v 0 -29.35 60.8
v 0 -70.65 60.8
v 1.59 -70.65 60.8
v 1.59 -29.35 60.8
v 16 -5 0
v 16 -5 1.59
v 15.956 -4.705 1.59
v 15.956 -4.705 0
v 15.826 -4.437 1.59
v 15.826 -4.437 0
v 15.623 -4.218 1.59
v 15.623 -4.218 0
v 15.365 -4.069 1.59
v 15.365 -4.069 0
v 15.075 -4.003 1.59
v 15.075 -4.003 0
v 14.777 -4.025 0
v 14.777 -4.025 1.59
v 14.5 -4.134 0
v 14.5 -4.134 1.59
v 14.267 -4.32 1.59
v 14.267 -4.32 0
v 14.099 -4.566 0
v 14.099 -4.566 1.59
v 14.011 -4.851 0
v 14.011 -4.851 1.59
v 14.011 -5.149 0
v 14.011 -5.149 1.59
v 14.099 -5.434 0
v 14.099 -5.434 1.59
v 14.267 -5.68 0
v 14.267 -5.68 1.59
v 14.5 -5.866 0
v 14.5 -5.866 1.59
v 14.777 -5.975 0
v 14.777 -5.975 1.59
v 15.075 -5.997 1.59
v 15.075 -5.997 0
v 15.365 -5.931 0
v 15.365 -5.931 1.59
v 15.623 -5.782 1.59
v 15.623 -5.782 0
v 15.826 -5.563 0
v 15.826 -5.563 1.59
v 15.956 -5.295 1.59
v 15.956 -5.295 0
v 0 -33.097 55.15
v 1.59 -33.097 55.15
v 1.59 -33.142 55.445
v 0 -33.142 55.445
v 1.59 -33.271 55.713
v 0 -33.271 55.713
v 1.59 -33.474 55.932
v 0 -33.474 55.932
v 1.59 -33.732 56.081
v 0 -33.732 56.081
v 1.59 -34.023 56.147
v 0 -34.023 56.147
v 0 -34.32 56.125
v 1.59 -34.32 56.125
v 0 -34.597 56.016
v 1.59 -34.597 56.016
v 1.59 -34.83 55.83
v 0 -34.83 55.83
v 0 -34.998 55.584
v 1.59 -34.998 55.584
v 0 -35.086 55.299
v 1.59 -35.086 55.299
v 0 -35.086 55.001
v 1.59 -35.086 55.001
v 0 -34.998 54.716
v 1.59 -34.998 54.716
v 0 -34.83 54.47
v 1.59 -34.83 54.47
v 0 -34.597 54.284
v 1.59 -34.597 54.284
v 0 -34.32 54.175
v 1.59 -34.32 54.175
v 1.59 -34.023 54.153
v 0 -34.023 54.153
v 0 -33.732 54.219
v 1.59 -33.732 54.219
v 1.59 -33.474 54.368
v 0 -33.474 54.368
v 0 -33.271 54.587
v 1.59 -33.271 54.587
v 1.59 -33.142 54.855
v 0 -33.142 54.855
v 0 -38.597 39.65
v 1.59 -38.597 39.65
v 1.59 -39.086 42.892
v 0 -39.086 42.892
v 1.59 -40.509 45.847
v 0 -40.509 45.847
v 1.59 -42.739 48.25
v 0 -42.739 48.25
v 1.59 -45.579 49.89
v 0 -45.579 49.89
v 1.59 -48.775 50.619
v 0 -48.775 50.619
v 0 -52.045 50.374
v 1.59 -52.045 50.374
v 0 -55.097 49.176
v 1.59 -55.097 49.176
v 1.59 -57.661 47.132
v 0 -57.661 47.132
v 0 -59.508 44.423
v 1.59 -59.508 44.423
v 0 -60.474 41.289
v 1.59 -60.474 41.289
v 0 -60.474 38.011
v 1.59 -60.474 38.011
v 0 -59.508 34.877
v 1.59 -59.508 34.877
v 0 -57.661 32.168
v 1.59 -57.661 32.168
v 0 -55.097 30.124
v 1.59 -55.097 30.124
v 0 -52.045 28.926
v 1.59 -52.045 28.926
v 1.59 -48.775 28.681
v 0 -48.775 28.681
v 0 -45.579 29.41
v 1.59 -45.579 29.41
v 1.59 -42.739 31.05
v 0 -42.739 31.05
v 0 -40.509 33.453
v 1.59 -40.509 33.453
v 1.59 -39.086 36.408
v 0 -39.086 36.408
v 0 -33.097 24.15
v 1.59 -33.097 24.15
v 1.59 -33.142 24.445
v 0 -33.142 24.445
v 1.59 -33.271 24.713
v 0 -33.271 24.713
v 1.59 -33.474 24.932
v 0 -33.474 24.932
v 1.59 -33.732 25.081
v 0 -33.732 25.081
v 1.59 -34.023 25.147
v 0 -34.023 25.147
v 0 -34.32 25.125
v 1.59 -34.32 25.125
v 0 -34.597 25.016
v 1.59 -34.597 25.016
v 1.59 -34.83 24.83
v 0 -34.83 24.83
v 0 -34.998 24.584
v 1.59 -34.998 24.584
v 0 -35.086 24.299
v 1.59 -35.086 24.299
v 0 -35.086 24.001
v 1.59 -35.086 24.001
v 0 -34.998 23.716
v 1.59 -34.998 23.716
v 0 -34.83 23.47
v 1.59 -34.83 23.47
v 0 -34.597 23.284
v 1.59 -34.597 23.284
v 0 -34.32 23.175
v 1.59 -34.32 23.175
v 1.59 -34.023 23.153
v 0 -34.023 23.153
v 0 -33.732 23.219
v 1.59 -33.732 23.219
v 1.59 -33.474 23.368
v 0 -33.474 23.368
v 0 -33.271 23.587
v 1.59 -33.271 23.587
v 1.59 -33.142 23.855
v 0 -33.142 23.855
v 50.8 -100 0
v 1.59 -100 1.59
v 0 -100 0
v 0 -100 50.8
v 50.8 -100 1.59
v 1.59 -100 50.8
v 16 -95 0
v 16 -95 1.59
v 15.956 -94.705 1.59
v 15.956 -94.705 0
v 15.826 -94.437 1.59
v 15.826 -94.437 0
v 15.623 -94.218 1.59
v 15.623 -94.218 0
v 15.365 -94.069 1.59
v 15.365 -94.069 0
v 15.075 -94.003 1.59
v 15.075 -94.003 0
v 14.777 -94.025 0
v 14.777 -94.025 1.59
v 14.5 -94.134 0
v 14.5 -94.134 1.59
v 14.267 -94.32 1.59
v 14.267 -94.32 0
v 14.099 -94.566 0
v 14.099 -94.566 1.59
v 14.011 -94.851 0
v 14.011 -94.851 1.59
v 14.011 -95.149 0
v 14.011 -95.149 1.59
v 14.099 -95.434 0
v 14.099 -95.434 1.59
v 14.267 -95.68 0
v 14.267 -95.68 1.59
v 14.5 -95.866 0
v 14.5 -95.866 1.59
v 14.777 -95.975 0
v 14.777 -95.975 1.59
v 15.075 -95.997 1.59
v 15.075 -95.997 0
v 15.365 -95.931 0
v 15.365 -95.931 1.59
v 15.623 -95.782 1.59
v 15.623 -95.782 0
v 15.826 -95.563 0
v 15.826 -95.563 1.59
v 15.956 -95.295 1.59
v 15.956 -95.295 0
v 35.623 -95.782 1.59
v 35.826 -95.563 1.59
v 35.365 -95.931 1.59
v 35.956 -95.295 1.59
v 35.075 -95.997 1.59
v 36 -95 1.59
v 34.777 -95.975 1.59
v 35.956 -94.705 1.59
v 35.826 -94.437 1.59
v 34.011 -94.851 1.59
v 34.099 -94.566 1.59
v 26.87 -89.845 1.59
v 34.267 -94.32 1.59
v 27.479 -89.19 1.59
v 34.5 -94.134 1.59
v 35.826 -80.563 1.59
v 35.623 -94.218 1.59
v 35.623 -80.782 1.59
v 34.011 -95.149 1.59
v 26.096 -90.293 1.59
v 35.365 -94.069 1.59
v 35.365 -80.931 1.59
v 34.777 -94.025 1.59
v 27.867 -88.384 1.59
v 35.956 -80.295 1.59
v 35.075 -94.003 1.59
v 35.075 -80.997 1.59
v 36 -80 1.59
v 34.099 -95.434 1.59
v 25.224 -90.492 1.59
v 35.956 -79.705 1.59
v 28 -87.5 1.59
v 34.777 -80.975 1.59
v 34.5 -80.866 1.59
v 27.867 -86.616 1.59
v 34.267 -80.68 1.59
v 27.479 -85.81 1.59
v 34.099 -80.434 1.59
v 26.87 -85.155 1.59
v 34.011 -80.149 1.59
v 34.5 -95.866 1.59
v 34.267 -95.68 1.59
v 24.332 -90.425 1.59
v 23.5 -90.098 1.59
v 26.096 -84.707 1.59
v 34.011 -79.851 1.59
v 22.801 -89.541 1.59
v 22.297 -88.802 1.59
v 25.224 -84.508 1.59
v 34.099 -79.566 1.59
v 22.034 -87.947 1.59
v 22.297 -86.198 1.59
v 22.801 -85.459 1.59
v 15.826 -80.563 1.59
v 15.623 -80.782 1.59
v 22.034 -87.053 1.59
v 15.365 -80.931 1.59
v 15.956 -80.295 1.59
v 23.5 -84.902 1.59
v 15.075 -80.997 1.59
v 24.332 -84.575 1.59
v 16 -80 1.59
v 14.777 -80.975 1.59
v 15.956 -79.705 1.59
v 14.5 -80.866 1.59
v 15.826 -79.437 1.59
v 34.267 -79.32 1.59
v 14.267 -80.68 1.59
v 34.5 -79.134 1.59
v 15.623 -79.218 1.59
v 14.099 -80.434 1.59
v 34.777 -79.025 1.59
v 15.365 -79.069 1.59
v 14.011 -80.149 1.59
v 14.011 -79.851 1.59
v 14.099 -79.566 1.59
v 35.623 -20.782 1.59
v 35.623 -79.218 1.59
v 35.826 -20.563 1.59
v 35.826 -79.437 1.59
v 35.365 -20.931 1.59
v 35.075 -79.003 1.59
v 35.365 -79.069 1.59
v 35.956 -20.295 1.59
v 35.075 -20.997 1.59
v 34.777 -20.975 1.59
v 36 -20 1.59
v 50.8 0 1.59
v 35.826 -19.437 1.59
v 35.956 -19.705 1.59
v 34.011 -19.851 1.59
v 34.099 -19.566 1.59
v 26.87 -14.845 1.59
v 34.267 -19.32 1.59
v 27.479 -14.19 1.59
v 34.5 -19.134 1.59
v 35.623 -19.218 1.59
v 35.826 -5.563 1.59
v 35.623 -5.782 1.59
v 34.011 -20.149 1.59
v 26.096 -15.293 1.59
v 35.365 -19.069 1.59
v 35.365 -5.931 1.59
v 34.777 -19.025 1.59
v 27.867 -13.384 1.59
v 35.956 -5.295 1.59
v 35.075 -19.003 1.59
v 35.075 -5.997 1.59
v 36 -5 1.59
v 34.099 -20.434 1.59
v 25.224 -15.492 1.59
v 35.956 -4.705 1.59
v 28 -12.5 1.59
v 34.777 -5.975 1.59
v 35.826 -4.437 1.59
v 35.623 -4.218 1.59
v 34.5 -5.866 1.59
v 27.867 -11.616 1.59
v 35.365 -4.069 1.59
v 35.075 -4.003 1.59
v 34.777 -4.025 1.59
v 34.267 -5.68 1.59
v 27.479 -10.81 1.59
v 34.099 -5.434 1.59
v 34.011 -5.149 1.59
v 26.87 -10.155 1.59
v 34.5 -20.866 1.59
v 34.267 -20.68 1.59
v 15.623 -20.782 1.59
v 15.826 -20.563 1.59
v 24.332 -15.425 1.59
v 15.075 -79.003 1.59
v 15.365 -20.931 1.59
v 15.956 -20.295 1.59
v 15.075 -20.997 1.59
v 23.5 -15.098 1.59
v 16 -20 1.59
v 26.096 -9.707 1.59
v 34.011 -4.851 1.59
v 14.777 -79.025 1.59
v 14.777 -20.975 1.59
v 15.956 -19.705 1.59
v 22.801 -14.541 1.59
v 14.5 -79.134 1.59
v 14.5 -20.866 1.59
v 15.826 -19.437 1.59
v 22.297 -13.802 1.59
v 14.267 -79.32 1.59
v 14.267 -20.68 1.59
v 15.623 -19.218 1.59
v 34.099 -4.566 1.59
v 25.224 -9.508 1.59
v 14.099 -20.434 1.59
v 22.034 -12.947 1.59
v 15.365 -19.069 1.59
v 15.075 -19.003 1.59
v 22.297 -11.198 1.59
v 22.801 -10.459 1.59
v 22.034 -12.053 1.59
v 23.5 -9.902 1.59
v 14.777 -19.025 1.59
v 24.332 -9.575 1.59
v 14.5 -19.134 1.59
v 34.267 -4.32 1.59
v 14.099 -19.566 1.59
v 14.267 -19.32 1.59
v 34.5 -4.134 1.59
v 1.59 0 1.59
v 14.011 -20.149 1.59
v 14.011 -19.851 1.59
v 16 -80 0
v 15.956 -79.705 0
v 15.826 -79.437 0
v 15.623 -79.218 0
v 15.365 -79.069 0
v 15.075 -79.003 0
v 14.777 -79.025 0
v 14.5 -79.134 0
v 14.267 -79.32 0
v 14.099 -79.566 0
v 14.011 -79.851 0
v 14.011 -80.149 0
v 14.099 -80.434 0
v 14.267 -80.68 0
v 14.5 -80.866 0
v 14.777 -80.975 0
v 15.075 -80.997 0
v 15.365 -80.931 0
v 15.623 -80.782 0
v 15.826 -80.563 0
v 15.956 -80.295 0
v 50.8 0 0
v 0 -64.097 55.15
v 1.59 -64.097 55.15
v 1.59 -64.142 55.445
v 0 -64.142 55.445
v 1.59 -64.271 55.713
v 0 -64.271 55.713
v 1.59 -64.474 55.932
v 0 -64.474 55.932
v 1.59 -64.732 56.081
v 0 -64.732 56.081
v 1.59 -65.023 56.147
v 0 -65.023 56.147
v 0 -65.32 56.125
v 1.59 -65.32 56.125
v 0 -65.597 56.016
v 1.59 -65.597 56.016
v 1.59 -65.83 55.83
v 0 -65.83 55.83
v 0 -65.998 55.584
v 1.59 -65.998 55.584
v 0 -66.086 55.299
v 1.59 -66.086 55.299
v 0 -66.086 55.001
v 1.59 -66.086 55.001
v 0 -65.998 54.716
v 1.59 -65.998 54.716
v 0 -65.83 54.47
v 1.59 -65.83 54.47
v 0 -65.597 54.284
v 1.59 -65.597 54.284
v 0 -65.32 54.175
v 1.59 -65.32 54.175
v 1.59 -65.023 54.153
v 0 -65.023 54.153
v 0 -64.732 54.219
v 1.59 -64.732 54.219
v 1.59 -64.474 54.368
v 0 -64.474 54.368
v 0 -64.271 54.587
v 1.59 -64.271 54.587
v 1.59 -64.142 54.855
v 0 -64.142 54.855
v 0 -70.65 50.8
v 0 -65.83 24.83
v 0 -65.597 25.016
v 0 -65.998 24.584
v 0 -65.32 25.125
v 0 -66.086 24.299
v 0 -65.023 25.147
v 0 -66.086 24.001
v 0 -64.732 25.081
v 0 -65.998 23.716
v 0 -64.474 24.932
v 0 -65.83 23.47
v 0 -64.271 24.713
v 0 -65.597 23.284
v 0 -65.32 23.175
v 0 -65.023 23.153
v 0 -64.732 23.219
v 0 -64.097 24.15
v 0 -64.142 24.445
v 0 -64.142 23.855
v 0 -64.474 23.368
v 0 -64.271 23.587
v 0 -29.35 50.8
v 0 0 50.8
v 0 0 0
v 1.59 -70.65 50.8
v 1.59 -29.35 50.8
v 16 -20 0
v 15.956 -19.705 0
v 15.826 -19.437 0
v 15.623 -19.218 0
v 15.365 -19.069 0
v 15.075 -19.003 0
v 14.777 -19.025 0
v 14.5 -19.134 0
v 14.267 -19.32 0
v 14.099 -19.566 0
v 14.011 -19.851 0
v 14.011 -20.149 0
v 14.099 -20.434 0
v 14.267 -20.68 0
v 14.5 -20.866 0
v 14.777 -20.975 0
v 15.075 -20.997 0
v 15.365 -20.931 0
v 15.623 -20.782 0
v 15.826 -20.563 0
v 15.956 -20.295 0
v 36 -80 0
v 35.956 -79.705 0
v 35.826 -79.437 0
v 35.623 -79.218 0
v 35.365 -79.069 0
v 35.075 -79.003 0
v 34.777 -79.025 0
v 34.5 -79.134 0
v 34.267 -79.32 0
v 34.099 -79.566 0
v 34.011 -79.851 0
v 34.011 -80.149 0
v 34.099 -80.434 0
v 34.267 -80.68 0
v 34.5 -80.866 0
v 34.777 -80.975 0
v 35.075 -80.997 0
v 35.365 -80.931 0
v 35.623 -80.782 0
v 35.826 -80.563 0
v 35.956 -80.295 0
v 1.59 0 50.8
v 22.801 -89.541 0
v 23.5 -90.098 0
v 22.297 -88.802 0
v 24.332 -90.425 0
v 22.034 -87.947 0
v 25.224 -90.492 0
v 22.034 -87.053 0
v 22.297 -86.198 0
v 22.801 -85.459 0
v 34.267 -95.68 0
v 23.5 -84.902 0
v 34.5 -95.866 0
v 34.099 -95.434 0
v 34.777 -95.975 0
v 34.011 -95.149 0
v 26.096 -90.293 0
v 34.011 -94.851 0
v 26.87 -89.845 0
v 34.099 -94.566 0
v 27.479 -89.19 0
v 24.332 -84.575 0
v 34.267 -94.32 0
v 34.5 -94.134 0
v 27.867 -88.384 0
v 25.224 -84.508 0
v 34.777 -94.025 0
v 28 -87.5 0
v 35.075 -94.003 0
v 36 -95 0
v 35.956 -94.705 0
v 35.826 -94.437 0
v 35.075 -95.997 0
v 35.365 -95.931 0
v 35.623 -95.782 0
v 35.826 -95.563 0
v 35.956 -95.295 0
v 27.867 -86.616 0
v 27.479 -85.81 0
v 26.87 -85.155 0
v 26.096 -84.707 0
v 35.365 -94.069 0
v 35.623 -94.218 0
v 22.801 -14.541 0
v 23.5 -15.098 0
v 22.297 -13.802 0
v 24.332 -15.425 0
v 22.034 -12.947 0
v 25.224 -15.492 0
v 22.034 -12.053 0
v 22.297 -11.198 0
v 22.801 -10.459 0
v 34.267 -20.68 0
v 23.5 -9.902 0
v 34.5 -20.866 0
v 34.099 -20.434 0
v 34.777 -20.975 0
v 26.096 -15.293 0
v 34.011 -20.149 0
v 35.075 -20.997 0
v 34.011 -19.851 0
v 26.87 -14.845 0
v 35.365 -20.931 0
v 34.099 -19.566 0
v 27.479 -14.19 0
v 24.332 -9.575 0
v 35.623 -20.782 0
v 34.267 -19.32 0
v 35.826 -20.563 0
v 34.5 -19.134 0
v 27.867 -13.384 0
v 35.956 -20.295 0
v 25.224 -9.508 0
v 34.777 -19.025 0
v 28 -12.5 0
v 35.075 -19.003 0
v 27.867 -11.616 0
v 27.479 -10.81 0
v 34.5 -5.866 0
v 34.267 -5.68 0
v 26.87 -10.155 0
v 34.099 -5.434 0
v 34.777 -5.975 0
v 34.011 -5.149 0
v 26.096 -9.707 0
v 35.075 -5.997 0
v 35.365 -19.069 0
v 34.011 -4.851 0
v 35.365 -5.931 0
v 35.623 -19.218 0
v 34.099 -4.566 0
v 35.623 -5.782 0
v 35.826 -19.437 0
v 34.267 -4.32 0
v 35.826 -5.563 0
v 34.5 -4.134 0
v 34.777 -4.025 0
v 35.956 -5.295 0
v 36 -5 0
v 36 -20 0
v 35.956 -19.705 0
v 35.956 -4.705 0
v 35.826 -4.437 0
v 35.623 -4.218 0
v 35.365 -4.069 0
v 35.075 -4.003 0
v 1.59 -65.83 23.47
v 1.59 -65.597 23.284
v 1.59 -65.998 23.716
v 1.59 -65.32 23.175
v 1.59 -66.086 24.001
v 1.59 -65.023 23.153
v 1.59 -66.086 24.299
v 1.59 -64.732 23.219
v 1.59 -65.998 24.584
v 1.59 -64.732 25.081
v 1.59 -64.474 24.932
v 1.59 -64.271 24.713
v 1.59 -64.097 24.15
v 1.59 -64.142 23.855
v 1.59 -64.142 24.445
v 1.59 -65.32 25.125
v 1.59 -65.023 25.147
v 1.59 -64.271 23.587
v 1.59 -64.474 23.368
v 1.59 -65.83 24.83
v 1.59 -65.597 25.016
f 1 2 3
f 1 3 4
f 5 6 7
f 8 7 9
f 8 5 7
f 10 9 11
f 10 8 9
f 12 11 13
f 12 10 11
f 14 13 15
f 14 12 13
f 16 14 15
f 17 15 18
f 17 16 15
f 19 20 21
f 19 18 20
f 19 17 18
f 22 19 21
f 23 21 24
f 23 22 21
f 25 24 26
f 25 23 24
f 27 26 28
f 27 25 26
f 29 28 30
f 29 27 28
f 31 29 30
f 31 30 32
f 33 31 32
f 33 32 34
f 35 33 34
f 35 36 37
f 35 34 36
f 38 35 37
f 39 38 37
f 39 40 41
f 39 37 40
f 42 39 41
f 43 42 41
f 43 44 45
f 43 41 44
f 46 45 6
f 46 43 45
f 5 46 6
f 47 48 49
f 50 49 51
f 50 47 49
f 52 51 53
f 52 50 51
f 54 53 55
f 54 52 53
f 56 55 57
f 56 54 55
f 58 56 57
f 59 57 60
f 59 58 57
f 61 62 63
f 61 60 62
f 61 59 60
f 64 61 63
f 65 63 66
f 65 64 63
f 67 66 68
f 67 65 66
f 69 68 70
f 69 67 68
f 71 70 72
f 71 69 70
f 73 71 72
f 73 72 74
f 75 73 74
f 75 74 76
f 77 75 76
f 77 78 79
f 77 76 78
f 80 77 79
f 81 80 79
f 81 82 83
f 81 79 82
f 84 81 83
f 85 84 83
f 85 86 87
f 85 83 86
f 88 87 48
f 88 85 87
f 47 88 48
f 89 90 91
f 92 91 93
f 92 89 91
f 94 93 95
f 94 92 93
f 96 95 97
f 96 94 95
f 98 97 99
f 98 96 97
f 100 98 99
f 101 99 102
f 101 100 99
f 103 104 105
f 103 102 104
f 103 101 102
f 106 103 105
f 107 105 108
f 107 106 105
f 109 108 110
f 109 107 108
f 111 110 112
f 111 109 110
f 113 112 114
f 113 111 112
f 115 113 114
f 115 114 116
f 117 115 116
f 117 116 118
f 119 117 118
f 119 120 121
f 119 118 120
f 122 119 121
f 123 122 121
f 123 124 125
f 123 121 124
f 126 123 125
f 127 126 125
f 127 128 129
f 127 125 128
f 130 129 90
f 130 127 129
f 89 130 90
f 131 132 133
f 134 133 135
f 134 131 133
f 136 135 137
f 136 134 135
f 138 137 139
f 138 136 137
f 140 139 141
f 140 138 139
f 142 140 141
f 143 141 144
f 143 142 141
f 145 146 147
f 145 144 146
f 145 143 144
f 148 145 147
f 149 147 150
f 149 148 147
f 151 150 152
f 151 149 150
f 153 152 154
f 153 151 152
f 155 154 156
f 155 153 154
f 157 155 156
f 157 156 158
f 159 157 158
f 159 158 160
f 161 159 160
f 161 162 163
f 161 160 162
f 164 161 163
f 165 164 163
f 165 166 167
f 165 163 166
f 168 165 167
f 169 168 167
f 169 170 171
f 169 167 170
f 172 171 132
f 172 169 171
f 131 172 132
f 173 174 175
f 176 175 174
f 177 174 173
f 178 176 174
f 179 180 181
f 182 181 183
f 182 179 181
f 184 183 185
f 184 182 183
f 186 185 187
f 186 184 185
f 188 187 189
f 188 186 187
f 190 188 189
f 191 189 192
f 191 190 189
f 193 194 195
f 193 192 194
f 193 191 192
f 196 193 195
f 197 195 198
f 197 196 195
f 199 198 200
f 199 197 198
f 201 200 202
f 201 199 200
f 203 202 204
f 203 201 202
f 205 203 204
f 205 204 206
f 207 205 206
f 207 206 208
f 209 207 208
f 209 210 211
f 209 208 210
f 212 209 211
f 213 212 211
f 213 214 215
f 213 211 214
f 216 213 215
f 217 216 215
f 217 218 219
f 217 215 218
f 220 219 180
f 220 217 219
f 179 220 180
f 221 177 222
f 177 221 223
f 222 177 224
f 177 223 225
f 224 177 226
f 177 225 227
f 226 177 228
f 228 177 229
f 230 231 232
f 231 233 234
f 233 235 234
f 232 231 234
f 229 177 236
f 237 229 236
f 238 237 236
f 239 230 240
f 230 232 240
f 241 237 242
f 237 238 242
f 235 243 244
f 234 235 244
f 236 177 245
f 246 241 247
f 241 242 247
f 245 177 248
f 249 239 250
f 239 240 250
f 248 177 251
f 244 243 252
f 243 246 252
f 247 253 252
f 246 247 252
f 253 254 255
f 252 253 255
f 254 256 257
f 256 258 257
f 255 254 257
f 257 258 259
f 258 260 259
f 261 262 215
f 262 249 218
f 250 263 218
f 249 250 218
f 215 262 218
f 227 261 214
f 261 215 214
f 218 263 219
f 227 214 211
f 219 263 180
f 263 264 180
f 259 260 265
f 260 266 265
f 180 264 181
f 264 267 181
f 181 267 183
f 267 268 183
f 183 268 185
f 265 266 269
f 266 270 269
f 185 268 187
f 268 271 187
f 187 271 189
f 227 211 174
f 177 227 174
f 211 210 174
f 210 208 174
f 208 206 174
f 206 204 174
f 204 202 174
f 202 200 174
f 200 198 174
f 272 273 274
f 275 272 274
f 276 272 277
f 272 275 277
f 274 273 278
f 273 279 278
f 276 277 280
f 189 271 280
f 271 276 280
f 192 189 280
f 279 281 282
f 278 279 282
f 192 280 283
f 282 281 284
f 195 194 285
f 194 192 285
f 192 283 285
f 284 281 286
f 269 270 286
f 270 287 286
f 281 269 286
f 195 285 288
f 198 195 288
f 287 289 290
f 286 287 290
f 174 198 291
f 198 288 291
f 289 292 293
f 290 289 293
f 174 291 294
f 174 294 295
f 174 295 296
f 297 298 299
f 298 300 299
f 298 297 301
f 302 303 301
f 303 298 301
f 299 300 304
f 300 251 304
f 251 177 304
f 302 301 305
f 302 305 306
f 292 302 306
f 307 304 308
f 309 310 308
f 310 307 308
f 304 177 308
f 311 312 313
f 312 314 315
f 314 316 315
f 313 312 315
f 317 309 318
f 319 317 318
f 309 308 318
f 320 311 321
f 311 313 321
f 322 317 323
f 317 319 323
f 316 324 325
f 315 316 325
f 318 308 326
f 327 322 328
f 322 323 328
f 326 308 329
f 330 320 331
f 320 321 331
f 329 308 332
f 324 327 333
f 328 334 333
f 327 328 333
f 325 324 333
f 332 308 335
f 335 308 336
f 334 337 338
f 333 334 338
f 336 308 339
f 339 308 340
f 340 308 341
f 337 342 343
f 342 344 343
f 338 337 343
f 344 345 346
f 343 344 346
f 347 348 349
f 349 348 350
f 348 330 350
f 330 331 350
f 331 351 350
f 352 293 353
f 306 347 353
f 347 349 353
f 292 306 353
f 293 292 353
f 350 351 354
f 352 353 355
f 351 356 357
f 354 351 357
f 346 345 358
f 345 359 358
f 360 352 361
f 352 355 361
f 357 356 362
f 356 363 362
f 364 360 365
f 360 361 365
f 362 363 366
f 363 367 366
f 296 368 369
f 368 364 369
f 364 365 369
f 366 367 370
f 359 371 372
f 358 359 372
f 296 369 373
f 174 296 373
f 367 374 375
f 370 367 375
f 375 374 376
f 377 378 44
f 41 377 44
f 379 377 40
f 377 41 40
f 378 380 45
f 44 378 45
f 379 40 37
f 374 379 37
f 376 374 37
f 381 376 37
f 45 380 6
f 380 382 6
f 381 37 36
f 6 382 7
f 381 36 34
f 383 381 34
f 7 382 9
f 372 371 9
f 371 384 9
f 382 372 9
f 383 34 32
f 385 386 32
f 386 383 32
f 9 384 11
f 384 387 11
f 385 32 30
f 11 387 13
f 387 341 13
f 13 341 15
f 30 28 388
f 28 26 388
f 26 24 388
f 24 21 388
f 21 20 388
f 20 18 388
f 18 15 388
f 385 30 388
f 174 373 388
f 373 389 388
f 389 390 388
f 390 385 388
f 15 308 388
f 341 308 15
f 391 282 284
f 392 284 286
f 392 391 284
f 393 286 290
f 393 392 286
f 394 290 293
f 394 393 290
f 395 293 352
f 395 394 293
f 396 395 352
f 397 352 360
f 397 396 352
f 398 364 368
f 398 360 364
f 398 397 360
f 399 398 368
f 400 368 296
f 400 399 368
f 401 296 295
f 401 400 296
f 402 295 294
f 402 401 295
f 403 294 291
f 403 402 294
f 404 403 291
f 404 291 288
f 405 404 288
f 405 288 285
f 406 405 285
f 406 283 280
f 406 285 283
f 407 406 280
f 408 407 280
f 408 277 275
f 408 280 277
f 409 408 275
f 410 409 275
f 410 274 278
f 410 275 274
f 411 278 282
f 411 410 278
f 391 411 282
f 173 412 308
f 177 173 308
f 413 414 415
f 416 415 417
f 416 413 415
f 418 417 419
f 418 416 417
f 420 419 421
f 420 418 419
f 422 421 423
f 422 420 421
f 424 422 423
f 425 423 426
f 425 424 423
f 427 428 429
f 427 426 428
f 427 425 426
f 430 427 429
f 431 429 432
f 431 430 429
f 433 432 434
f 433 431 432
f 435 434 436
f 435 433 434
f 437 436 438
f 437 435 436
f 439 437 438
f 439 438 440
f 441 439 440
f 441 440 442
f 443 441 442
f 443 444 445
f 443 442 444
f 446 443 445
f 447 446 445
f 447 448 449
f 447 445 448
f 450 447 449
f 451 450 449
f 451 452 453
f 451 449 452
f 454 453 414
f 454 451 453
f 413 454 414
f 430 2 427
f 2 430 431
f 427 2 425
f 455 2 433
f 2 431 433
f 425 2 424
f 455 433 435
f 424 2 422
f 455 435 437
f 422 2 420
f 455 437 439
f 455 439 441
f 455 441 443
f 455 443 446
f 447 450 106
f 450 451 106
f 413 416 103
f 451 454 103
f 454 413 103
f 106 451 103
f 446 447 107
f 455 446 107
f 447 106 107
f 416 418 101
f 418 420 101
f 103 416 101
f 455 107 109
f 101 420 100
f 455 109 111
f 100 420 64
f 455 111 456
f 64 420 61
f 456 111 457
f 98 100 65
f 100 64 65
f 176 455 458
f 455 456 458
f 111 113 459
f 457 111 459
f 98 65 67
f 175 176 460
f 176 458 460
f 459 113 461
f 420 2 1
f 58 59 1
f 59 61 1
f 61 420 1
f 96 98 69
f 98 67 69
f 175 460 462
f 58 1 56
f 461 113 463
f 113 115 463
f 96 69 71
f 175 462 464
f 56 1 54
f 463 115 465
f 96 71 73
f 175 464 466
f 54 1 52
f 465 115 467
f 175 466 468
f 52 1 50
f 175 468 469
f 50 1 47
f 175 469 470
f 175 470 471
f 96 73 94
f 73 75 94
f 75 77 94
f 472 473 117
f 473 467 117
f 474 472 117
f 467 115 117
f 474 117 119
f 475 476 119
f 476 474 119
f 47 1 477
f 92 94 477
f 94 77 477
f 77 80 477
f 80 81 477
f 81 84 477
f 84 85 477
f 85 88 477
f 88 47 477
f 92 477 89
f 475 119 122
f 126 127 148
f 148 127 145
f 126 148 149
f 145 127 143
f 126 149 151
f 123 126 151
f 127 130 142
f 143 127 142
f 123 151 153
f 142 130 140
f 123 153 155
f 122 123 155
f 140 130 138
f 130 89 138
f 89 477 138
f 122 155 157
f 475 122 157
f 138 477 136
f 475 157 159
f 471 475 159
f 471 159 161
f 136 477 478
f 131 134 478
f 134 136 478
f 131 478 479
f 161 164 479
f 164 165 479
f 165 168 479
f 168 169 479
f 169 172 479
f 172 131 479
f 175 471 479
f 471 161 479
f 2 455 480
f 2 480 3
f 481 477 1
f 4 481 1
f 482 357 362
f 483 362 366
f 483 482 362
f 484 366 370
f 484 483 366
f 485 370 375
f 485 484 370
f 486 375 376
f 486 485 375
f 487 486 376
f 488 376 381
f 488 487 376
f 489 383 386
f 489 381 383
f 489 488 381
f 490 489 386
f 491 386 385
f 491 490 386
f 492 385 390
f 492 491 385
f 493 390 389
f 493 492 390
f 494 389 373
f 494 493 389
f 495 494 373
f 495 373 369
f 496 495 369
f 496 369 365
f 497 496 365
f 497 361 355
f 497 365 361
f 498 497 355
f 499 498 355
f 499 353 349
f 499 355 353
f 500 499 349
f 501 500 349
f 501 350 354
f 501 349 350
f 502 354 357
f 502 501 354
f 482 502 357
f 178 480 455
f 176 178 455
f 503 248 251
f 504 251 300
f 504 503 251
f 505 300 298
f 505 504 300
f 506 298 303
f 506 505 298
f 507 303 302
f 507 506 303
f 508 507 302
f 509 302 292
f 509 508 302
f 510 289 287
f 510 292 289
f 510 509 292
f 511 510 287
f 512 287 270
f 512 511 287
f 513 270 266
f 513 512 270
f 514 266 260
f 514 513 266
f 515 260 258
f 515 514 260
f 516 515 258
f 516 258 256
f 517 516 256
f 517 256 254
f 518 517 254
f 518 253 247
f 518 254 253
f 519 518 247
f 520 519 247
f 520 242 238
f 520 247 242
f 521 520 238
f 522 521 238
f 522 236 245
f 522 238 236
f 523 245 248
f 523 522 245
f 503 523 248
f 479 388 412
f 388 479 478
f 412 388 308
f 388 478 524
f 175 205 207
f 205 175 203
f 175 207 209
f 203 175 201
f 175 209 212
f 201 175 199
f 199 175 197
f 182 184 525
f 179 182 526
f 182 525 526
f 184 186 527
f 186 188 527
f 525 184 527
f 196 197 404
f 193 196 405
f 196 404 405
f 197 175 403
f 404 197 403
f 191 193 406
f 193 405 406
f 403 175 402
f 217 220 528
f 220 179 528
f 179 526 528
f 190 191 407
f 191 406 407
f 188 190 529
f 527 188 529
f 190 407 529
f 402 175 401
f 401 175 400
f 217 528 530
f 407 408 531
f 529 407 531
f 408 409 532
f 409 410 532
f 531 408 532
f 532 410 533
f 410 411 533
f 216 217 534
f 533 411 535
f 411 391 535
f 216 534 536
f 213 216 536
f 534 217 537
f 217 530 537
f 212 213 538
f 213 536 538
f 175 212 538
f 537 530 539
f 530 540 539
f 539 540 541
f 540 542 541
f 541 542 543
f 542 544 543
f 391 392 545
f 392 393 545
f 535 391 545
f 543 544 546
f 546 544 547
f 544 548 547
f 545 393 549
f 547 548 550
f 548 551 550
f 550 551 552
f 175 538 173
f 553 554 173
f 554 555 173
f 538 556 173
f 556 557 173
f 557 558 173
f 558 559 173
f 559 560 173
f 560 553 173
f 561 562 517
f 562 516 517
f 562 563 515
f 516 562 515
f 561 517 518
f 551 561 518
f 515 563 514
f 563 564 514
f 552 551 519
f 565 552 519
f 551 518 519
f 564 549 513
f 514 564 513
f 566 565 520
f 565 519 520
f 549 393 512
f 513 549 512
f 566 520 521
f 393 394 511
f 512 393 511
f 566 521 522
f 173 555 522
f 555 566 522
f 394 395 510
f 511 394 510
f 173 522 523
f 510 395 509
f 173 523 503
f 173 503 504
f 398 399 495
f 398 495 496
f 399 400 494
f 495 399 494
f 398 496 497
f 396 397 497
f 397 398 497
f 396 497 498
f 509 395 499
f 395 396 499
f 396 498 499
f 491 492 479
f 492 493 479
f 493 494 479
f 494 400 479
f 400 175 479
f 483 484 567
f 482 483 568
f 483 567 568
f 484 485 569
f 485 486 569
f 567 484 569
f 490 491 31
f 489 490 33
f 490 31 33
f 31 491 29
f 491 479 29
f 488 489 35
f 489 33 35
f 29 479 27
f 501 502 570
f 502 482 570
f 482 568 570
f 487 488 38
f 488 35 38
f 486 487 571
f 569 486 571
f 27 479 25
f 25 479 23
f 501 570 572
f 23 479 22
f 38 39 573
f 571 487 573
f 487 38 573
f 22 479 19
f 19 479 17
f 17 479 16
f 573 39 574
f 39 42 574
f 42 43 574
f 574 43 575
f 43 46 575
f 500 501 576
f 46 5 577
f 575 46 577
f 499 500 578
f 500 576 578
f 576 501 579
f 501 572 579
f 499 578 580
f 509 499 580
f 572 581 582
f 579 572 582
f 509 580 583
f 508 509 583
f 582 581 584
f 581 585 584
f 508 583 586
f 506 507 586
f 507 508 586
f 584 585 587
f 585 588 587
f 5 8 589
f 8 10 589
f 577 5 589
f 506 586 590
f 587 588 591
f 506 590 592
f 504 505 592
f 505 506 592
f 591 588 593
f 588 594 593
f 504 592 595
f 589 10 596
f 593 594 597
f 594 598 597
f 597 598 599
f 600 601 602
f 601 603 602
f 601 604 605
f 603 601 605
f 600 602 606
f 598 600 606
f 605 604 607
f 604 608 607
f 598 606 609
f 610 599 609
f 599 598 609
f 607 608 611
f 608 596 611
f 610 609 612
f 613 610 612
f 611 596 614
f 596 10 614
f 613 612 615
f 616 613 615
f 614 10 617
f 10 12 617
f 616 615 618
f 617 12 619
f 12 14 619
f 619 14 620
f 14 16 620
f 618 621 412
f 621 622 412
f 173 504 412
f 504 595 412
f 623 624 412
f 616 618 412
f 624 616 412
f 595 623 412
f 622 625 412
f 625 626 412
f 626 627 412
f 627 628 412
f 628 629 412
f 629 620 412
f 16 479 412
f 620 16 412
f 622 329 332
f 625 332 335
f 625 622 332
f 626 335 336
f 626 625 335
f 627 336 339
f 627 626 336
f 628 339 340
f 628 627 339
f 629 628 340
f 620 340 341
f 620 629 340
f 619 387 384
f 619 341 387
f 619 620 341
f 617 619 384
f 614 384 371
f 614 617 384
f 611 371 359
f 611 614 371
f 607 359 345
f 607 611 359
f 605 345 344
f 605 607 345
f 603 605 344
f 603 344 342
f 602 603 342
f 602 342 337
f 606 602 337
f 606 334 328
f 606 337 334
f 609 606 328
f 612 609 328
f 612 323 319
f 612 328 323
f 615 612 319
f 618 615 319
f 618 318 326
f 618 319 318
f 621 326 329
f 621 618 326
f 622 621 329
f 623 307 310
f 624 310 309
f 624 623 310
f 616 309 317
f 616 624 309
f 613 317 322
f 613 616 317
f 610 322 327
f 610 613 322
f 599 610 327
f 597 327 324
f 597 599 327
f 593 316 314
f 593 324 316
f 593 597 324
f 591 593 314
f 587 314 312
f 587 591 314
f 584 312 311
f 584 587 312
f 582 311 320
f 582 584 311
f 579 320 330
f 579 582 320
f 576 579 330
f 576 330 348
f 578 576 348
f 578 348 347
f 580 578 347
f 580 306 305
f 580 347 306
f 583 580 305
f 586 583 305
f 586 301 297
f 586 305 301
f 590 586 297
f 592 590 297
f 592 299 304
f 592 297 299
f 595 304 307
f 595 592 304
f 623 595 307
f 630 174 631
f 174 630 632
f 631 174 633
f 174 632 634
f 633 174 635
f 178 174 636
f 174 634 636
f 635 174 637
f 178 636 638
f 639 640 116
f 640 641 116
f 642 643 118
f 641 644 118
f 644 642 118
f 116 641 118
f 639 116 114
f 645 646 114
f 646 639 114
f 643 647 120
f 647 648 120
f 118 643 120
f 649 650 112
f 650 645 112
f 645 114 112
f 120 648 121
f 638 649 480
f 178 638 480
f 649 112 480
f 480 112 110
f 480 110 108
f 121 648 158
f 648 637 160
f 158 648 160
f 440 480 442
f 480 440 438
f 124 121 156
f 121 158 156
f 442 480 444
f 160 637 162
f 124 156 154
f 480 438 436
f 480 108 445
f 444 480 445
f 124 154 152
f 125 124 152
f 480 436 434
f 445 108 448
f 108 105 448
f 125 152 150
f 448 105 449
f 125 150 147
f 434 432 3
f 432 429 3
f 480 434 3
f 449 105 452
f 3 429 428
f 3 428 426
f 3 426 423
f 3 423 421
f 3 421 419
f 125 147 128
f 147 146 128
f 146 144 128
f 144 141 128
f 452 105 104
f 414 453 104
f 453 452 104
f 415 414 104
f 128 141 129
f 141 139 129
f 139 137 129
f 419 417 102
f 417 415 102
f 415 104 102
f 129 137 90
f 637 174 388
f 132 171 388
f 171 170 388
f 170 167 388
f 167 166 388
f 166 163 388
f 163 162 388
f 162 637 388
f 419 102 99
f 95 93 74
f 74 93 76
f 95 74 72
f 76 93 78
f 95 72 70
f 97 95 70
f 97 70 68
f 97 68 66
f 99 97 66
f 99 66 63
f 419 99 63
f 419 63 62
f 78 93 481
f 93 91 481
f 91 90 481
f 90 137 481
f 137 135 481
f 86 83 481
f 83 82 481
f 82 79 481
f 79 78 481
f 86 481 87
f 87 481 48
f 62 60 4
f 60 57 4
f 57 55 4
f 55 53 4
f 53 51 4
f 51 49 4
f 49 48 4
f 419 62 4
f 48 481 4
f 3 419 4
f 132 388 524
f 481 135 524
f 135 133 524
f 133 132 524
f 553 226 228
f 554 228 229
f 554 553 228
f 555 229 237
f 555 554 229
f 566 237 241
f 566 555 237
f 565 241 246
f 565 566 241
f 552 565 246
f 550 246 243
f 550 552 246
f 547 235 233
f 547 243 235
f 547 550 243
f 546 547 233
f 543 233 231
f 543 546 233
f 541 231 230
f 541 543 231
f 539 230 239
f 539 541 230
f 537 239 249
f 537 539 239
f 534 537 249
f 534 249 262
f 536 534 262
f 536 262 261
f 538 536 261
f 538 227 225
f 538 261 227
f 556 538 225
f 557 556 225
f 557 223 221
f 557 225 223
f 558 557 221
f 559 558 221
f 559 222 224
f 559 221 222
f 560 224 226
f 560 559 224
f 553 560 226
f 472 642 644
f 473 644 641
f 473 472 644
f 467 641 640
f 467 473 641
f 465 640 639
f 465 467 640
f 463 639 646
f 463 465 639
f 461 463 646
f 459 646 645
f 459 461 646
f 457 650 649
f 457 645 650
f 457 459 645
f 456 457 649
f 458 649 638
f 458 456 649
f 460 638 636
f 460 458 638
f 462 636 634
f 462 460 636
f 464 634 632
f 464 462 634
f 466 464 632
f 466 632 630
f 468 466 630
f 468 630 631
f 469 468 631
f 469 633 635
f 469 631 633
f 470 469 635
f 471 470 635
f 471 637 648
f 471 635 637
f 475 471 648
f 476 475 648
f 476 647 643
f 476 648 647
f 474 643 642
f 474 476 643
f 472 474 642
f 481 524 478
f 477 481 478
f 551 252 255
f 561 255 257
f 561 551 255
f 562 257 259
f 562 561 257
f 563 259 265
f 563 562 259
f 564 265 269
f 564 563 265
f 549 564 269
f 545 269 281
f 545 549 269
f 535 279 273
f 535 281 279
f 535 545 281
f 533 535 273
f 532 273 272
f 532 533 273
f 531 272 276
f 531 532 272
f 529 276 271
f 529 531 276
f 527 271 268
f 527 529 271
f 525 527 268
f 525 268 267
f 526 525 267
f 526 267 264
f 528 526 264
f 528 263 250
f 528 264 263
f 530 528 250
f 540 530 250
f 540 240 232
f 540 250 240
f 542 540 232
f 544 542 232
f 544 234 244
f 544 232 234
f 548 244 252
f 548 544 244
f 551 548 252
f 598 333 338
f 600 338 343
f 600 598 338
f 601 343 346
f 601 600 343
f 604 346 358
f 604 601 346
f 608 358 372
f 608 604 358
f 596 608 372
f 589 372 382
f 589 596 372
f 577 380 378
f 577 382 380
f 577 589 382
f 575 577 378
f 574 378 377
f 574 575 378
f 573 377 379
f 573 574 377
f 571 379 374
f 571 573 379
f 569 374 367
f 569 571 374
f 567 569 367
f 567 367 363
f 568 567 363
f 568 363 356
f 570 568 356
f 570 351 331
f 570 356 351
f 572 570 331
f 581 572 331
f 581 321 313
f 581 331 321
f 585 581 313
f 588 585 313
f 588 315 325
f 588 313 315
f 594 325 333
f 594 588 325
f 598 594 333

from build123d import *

# Parameters (mm, degrees)
F1_DEPTH = 100
F2_R     = 1
F2_R_2   = 3
F3_DEPTH = 50.801
F4_W     = 41.3
F4_H     = 10
F5_DEPTH = 1.59
F6_R     = 1
F6_R_2   = 11
F7_DEPTH = 50.801


with BuildPart() as f1:
    # F0 (on Front) → F1 (new body)
    with BuildSketch(Plane.XZ):
        Polygon((0, 50.8), (0, 0), (50.8, 0), (50.8, 1.59), (1.59, 1.59), (1.59, 50.8), align=None)
    extrude(amount=F1_DEPTH)

    # F2 (on Top) → F3 (cut, through all)
    with BuildSketch(Plane.XY):
        with Locations((15, -5)):
            Circle(F2_R)
        with Locations((35, -5)):
            Circle(F2_R)
        with Locations((15, -20)):
            Circle(F2_R)
        with Locations((35, -20)):
            Circle(F2_R)
        with Locations((35, -80)):
            Circle(F2_R)
        with Locations((15, -80)):
            Circle(F2_R)
        with Locations((35, -95)):
            Circle(F2_R)
        with Locations((15, -95)):
            Circle(F2_R)
        with Locations((25, -87.5)):
            Circle(F2_R_2)
        with Locations((25, -12.5)):
            Circle(F2_R_2)
    extrude(amount=F3_DEPTH, mode=Mode.SUBTRACT)

    # F4 (on Right) → F5 (join)
    with BuildSketch(Plane.YZ):
        with Locations((-50, 55.8)):
            Rectangle(F4_W, F4_H)
    extrude(amount=F5_DEPTH)

    # F6 (on Right) → F7 (cut, through all)
    with BuildSketch(Plane.YZ):
        with Locations((-65.097293, 24.15)):
            Circle(F6_R)
        with Locations((-34.097293, 24.15)):
            Circle(F6_R)
        with Locations((-34.097293, 55.15)):
            Circle(F6_R)
        with Locations((-65.097293, 55.15)):
            Circle(F6_R)
        with Locations((-49.597293, 39.65)):
            Circle(F6_R_2)
    extrude(amount=F7_DEPTH, mode=Mode.SUBTRACT)


solid = f1.part
